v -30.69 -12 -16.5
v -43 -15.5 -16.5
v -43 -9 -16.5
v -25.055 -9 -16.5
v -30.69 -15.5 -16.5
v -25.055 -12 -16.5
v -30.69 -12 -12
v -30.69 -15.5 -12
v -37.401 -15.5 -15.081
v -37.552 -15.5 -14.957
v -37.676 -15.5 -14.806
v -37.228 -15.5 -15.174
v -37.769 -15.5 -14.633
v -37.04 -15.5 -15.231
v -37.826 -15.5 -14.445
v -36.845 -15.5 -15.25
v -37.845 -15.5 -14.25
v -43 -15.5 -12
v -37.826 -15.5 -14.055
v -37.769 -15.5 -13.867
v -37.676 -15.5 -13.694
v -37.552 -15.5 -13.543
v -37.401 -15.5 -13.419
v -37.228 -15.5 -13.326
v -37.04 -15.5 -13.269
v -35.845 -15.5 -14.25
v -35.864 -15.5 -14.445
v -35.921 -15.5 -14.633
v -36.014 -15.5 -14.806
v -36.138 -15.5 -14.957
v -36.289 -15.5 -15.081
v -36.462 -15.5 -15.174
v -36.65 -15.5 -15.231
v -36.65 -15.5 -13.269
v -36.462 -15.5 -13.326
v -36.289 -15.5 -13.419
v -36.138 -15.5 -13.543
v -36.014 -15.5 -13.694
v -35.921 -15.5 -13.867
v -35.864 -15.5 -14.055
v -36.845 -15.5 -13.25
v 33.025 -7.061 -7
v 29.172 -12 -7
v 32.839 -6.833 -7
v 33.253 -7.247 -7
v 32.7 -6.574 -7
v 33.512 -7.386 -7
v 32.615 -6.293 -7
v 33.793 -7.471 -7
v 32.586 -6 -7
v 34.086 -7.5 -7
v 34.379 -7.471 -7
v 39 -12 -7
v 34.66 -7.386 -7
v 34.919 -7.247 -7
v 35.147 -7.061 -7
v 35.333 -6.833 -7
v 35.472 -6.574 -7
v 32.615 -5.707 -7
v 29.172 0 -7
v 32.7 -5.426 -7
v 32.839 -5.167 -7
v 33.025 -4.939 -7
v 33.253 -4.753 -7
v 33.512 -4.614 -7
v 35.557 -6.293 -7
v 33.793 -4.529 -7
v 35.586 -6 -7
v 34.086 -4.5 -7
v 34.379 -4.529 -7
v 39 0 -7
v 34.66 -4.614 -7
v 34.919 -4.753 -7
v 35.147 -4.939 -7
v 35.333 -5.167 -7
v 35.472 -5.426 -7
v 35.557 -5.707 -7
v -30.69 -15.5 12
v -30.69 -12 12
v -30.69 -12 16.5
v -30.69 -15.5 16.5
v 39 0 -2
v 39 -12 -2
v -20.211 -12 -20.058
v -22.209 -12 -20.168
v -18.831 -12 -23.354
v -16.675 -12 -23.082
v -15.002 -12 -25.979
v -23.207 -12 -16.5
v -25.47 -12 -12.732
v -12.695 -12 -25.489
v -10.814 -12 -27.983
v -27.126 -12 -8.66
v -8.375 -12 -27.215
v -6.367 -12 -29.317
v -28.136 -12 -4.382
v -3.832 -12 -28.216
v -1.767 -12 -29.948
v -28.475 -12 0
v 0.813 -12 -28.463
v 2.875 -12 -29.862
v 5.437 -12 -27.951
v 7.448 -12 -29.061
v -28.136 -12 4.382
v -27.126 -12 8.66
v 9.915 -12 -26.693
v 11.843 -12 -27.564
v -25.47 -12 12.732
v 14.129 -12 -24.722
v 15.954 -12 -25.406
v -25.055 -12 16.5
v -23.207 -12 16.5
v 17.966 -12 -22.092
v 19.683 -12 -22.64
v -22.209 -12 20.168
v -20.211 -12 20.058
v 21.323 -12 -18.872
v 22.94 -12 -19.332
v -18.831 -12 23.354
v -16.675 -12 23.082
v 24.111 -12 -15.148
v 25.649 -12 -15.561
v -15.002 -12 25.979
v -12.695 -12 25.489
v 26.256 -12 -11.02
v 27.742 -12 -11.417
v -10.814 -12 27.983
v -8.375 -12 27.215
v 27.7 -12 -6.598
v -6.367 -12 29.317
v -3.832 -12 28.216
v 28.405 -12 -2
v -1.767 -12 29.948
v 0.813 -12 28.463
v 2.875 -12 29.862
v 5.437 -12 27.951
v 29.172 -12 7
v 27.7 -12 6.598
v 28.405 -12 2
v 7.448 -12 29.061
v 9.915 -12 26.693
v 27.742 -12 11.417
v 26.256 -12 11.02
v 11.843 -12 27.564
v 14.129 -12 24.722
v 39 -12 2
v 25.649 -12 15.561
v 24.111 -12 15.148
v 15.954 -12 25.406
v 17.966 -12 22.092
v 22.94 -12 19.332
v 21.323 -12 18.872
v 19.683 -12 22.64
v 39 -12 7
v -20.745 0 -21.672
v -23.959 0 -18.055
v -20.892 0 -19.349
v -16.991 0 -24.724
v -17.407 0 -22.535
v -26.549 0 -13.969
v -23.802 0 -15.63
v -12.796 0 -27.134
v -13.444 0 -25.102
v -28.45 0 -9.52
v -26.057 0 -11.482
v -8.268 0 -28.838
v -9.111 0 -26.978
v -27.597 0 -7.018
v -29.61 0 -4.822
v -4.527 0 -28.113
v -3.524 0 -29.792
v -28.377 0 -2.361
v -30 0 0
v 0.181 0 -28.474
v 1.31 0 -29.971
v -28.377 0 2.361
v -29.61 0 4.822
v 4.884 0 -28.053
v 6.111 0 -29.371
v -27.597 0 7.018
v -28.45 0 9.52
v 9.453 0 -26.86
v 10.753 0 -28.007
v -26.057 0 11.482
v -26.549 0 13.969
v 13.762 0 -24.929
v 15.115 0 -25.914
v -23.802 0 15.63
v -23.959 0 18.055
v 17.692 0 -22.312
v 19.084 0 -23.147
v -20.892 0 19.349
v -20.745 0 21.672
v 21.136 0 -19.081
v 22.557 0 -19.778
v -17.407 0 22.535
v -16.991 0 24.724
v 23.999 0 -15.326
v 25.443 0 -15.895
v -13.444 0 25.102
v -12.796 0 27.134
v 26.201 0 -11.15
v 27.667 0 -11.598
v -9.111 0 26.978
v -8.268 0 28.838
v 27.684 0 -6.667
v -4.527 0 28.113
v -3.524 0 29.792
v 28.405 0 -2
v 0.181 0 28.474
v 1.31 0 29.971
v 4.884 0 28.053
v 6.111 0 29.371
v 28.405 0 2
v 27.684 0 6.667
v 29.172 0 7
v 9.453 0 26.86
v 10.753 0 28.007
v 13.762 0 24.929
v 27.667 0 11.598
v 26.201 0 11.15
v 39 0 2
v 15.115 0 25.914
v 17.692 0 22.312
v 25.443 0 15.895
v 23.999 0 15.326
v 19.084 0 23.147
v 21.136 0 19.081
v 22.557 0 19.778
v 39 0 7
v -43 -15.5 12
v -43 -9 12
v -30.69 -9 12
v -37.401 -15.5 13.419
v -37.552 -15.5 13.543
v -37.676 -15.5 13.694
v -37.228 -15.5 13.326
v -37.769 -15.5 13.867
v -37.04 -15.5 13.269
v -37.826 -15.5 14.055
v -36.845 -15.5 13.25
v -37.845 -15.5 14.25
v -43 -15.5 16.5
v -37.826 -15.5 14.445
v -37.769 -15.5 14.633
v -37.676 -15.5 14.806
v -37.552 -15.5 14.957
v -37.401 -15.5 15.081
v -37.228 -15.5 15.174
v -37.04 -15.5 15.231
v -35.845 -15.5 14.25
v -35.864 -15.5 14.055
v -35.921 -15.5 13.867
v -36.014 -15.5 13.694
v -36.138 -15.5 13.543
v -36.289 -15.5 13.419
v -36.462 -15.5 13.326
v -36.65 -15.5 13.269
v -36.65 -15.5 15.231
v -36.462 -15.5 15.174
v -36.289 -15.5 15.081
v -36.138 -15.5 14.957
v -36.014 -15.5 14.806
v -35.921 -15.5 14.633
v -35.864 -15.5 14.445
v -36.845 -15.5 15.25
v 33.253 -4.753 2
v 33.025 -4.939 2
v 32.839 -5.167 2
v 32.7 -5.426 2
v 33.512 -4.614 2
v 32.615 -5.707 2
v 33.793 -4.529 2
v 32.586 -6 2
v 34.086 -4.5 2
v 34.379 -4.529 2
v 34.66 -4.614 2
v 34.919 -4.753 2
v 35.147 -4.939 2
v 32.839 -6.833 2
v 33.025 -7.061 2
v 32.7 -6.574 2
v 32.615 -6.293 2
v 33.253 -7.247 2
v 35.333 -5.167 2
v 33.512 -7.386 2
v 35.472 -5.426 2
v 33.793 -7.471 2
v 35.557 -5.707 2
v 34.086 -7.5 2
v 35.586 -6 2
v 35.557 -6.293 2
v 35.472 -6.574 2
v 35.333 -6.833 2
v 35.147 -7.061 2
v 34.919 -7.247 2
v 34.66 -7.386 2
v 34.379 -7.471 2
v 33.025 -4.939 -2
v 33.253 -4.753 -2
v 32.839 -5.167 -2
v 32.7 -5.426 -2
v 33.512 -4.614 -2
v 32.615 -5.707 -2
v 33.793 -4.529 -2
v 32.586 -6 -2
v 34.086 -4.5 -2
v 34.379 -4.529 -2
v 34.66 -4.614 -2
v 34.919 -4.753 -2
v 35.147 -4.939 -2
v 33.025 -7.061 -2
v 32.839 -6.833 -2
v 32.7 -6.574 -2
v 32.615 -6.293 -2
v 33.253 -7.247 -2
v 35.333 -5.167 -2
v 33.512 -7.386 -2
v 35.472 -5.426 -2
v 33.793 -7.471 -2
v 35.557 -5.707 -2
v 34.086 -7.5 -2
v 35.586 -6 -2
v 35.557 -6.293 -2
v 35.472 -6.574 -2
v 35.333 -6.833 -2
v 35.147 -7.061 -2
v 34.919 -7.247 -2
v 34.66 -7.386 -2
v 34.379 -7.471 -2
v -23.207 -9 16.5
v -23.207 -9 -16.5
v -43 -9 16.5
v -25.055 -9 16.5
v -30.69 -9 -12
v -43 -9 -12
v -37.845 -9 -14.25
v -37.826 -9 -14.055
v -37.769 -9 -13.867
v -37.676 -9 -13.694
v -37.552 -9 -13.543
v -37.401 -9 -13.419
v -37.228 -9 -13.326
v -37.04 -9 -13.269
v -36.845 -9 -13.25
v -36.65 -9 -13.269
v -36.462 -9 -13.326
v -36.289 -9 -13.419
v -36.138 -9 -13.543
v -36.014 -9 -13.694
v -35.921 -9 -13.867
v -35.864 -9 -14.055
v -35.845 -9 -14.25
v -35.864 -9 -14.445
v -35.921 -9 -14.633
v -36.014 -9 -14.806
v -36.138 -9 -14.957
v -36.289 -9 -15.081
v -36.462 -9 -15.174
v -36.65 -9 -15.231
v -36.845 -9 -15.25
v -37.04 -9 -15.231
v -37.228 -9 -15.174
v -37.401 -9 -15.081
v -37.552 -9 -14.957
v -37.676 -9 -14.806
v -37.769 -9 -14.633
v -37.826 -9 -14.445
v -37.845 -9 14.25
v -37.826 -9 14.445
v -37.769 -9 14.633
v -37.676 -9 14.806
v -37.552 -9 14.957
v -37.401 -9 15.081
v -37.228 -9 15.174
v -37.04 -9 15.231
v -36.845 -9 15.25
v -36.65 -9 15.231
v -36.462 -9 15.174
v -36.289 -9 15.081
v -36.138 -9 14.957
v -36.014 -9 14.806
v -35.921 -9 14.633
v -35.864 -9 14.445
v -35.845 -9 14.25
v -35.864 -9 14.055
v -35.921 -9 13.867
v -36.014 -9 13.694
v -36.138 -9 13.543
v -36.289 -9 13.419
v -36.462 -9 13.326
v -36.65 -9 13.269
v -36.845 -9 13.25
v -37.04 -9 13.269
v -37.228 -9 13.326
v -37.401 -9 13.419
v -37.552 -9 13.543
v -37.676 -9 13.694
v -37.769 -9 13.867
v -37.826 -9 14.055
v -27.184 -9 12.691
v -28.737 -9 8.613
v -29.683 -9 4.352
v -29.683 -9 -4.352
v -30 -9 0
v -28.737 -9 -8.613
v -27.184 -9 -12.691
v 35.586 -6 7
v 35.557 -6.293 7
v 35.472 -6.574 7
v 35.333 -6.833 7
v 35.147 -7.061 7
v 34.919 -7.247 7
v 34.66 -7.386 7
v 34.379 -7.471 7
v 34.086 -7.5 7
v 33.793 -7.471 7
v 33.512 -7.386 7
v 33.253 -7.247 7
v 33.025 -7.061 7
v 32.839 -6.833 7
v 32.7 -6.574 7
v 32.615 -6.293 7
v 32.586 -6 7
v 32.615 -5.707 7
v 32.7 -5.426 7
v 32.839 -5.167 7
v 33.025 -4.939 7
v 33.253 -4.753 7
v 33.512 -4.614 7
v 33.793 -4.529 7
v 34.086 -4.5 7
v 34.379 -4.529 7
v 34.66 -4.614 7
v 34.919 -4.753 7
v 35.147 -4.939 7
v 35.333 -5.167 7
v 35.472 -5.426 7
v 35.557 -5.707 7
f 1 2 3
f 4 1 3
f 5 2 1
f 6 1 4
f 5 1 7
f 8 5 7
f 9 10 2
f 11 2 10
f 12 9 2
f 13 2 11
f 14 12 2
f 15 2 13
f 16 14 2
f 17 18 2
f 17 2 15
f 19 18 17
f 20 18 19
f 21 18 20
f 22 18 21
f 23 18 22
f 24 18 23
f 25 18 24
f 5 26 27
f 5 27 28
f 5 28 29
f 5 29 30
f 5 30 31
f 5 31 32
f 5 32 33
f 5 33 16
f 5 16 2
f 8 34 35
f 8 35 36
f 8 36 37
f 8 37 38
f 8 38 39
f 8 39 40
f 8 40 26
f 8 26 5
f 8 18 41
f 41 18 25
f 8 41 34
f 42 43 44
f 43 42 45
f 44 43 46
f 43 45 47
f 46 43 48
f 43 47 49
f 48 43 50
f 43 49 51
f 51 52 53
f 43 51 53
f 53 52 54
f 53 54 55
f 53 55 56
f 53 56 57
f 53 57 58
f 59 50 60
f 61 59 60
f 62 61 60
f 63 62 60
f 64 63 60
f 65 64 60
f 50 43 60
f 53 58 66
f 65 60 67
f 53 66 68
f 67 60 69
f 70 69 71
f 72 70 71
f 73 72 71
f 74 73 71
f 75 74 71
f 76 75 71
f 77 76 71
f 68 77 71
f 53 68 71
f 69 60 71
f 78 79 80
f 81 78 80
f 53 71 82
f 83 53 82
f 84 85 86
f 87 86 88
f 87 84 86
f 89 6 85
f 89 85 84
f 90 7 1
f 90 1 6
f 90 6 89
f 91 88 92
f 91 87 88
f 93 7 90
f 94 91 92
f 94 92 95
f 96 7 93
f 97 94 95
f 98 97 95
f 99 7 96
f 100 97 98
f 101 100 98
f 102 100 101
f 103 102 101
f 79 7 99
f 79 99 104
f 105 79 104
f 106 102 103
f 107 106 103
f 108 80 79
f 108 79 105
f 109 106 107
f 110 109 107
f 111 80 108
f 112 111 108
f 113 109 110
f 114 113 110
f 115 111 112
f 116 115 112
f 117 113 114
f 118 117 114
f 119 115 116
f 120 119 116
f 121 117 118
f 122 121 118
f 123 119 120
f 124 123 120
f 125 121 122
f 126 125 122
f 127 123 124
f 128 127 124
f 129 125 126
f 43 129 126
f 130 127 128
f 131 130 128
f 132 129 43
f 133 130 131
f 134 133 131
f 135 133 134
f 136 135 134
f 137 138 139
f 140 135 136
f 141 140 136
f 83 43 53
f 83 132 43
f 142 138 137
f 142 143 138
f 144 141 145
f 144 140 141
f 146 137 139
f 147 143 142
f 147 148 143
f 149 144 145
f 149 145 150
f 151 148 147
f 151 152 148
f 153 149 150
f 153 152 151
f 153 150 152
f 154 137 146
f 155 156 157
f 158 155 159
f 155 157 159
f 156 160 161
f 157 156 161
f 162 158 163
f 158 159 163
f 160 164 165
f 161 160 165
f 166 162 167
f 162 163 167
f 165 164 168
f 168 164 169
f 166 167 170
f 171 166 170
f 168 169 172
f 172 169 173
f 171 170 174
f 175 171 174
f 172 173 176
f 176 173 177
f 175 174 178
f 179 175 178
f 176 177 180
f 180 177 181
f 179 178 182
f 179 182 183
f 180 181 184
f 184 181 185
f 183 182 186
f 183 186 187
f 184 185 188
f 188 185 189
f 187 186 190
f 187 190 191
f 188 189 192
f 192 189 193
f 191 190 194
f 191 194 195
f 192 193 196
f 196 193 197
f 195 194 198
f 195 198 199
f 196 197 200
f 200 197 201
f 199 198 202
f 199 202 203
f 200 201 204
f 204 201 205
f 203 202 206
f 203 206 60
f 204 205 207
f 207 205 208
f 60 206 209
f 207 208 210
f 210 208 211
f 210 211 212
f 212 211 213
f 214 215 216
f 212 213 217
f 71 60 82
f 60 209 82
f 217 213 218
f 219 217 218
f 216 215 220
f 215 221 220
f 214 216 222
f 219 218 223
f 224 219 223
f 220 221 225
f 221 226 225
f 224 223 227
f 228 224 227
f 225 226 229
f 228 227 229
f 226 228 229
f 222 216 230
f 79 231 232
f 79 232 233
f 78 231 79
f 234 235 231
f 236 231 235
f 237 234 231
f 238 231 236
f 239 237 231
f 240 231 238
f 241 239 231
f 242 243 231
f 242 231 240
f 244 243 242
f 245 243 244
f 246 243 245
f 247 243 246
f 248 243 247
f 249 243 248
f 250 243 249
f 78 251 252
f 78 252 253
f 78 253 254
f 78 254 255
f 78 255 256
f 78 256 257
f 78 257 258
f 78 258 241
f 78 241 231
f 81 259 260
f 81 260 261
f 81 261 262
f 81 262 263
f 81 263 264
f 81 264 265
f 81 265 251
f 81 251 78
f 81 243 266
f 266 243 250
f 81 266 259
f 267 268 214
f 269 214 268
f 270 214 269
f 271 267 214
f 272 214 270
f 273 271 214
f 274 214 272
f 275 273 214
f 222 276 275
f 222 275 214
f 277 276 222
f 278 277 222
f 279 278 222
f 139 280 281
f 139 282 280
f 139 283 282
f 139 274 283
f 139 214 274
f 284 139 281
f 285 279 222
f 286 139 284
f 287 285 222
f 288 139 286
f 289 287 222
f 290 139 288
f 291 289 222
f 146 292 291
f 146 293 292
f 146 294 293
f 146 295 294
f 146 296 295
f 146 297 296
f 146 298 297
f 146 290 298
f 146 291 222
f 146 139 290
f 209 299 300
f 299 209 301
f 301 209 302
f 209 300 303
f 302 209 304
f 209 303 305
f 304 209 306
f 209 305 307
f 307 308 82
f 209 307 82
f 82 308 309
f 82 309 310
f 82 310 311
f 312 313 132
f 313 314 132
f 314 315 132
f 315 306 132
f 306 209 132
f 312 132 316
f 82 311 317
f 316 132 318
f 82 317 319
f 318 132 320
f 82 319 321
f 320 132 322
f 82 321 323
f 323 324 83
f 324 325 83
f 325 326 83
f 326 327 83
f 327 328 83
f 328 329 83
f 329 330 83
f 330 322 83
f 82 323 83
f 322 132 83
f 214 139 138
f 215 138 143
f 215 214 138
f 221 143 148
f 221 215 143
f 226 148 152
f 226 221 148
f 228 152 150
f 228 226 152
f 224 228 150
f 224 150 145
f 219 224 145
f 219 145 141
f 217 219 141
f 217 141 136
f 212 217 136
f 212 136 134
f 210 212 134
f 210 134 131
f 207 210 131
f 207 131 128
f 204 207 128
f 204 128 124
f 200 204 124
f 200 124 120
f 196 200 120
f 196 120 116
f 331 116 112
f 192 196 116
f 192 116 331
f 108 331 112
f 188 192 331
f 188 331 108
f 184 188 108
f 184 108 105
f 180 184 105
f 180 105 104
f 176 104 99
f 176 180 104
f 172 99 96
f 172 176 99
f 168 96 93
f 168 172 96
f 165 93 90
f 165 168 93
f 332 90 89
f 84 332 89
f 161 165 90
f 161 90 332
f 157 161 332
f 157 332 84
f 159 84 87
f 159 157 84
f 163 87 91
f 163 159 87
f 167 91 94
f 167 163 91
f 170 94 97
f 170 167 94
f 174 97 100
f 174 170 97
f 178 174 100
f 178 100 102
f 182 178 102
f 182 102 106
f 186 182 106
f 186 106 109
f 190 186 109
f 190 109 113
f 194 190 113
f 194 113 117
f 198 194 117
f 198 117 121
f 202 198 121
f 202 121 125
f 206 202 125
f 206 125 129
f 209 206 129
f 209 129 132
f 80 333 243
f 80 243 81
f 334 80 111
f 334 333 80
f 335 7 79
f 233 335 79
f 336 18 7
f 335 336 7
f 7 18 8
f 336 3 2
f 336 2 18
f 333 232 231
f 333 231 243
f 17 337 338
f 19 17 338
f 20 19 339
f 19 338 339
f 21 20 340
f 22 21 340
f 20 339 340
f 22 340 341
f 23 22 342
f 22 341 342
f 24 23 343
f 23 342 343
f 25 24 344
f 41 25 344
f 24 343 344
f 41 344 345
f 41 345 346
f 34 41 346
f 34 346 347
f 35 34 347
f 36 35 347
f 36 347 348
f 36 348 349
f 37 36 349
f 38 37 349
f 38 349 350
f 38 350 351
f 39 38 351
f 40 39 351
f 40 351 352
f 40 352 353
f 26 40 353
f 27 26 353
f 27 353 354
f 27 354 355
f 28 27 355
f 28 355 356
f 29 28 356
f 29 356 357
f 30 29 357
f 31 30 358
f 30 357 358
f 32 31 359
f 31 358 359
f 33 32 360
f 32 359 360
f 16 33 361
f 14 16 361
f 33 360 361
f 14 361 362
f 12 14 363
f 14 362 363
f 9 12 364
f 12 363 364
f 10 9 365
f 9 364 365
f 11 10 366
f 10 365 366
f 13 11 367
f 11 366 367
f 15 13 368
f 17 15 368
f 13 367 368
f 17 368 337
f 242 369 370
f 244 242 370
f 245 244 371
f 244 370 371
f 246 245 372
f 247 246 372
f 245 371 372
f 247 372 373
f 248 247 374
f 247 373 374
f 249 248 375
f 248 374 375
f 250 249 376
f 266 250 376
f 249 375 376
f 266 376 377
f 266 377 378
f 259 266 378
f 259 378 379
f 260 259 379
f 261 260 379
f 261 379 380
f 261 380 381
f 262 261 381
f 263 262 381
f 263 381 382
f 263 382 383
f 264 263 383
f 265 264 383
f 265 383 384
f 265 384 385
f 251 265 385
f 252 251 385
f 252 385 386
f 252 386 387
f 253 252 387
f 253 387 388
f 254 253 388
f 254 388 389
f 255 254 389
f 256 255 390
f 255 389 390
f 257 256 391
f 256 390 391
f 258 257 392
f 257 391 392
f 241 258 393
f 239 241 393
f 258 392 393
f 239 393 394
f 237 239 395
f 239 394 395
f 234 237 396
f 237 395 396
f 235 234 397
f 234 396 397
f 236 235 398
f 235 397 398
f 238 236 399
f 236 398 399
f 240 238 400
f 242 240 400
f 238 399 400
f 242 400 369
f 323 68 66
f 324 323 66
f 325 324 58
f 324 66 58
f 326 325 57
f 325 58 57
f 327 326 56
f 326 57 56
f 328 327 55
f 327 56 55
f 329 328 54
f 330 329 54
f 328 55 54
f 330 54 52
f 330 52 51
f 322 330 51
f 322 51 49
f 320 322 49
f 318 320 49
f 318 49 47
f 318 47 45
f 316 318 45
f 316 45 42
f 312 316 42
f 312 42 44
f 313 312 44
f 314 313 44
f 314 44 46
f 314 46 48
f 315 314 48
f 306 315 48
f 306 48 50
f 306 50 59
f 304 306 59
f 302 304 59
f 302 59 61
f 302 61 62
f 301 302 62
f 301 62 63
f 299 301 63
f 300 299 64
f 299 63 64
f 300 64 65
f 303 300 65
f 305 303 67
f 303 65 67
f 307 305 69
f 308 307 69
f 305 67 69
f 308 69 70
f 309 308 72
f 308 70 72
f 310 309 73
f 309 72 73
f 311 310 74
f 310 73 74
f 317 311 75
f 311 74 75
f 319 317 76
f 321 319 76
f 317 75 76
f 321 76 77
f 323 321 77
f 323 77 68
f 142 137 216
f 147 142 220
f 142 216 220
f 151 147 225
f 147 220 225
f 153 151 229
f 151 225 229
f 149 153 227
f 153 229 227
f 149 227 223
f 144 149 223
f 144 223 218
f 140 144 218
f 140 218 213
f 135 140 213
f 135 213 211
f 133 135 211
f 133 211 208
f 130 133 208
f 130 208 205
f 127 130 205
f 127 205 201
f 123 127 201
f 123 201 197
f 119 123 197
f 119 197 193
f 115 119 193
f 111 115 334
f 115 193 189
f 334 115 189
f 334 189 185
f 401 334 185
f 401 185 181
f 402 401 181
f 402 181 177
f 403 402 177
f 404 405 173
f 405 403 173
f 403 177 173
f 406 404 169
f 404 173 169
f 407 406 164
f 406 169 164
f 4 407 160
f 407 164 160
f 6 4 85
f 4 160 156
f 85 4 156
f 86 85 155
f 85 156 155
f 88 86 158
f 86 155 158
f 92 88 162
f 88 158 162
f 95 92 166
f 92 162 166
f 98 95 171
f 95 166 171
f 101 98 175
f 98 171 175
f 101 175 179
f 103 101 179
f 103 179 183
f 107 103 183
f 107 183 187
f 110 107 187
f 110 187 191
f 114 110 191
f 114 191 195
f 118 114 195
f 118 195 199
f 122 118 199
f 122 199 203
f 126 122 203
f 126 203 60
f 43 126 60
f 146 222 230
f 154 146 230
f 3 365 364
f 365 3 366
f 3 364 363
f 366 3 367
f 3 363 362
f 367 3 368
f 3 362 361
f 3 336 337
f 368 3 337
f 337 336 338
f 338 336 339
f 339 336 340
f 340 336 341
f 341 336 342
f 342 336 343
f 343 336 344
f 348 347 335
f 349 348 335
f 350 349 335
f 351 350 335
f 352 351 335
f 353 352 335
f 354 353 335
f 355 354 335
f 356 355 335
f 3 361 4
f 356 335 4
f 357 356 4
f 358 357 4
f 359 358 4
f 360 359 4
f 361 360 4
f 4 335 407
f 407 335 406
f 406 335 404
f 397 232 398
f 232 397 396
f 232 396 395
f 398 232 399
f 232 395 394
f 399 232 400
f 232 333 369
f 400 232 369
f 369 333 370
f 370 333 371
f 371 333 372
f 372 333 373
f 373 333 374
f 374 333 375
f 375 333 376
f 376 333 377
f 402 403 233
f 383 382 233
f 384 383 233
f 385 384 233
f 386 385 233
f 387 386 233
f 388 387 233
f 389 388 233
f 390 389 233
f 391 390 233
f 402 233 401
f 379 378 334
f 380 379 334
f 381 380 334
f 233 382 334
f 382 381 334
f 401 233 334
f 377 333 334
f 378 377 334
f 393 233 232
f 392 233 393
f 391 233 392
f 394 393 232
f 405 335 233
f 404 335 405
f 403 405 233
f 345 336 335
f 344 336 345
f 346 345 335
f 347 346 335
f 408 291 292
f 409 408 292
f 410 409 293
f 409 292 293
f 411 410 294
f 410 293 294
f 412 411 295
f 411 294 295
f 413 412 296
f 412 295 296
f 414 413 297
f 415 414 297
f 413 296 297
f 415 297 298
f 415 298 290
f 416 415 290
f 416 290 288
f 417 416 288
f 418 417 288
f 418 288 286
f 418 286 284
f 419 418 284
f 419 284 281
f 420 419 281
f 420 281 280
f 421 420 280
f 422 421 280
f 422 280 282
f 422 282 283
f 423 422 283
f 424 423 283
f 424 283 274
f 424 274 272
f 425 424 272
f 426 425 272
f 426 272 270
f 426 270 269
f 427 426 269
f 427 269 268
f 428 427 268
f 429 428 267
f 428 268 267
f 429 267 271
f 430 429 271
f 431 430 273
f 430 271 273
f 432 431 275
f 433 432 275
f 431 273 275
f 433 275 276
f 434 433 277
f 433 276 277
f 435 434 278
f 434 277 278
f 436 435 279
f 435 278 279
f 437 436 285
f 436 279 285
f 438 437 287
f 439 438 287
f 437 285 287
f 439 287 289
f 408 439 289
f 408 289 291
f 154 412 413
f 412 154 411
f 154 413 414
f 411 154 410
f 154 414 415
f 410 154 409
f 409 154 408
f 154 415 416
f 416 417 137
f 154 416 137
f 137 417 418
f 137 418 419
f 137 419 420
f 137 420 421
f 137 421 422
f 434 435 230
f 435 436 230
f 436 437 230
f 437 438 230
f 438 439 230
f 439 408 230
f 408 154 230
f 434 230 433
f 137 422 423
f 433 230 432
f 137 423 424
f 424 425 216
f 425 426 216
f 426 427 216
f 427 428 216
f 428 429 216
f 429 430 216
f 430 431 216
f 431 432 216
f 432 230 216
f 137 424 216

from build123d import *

# Parameters (mm, degrees)
F0_R      = 28.475
F1_DEPTH  = 12
F2_W      = 19.991411
F2_H      = 4
F3_DEPTH  = 25
F4_R      = 1.5
F5_DEPTH  = 25
F7_DEPTH  = 3
F8_W      = 12.31
F8_H      = 4.5
F9_DEPTH  = 3.5
F10_W     = 12.31
F10_H     = 24
F11_DEPTH = 25
F12_R     = 1
F13_DEPTH = 25


with BuildPart() as f1:
    # F0 (on Front) → F1 (new body)
    with BuildSketch(Plane.XZ):
        with BuildLine():
            ThreePointArc((29.171904, -7), (29.792257, -3.524406), (30, 0))
            ThreePointArc((30, 0), (29.792257, 3.524406), (29.171904, 7))
            ThreePointArc((29.171904, 7), (-30, 0), (29.171904, -7))
        make_face()
        Circle(F0_R, mode=Mode.SUBTRACT)
        with BuildLine():
            Line((39, 0), (30, 0))
            ThreePointArc((30, 0), (29.792257, -3.524406), (29.171904, -7))
            Line((29.171904, -7), (39, -7))
            Line((39, -7), (39, 0))
        make_face()
        with BuildLine():
            ThreePointArc((29.171904, 7), (29.792257, 3.524406), (30, 0))
            Line((30, 0), (39, 0))
            Line((39, 0), (39, 7))
            Line((39, 7), (29.171904, 7))
        make_face()
    extrude(amount=F1_DEPTH)

    # F2 (on face) → F3 (cut)
    with BuildSketch(Plane.XZ.offset(12)):
        with Locations((34.155282, 0)):
            Rectangle(F2_W, F2_H)
    extrude(amount=-F3_DEPTH, mode=Mode.SUBTRACT)

    # F4 (on face) → F5 (cut)
    with BuildSketch(Plane(origin=(0, 0, -7), x_dir=(1, 0, 0), z_dir=(0, 0, -1))):
        with Locations((34.085952, 6)):
            Circle(F4_R)
    extrude(amount=-F5_DEPTH, mode=Mode.SUBTRACT)

    # F6 (on face) → F7 (join)
    with BuildSketch(Plane.XZ.offset(12)):
        with BuildLine():
            Line((-43, 16.5), (-43, 0))
            Line((-43, 0), (-43, -16.5))
            Line((-43, -16.5), (-25.05494, -16.5))
            Line((-25.05494, -16.5), (-23.207232, -16.5))
            ThreePointArc((-23.207232, -16.5), (-28.595733, 0), (-23.207232, 16.5))
            Line((-23.207232, 16.5), (-25.05494, 16.5))
            Line((-25.05494, 16.5), (-43, 16.5))
        make_face()
    extrude(amount=-F7_DEPTH)

    # F8 (on face) → F9 (join)
    with BuildSketch(Plane.XZ.offset(12)):
        with Locations((-36.845, 14.25)):
            Rectangle(F8_W, F8_H)
        with Locations((-36.845, -14.25)):
            Rectangle(F8_W, F8_H)
    extrude(amount=F9_DEPTH)

    # F10 (on face) → F11 (cut)
    with BuildSketch(Plane.XZ.offset(12)):
        with Locations((-36.845, 0)):
            Rectangle(F10_W, F10_H)
    extrude(amount=-F11_DEPTH, mode=Mode.SUBTRACT)

    # F12 (on face) → F13 (cut)
    with BuildSketch(Plane(origin=(0, -9, 0), x_dir=(-1, 0, 0), z_dir=(0, 1, 0))):
        with Locations((36.845, 14.25)):
            Circle(F12_R)
        with Locations((36.845, -14.25)):
            Circle(F12_R)
    extrude(amount=-F13_DEPTH, mode=Mode.SUBTRACT)


solid = f1.part
